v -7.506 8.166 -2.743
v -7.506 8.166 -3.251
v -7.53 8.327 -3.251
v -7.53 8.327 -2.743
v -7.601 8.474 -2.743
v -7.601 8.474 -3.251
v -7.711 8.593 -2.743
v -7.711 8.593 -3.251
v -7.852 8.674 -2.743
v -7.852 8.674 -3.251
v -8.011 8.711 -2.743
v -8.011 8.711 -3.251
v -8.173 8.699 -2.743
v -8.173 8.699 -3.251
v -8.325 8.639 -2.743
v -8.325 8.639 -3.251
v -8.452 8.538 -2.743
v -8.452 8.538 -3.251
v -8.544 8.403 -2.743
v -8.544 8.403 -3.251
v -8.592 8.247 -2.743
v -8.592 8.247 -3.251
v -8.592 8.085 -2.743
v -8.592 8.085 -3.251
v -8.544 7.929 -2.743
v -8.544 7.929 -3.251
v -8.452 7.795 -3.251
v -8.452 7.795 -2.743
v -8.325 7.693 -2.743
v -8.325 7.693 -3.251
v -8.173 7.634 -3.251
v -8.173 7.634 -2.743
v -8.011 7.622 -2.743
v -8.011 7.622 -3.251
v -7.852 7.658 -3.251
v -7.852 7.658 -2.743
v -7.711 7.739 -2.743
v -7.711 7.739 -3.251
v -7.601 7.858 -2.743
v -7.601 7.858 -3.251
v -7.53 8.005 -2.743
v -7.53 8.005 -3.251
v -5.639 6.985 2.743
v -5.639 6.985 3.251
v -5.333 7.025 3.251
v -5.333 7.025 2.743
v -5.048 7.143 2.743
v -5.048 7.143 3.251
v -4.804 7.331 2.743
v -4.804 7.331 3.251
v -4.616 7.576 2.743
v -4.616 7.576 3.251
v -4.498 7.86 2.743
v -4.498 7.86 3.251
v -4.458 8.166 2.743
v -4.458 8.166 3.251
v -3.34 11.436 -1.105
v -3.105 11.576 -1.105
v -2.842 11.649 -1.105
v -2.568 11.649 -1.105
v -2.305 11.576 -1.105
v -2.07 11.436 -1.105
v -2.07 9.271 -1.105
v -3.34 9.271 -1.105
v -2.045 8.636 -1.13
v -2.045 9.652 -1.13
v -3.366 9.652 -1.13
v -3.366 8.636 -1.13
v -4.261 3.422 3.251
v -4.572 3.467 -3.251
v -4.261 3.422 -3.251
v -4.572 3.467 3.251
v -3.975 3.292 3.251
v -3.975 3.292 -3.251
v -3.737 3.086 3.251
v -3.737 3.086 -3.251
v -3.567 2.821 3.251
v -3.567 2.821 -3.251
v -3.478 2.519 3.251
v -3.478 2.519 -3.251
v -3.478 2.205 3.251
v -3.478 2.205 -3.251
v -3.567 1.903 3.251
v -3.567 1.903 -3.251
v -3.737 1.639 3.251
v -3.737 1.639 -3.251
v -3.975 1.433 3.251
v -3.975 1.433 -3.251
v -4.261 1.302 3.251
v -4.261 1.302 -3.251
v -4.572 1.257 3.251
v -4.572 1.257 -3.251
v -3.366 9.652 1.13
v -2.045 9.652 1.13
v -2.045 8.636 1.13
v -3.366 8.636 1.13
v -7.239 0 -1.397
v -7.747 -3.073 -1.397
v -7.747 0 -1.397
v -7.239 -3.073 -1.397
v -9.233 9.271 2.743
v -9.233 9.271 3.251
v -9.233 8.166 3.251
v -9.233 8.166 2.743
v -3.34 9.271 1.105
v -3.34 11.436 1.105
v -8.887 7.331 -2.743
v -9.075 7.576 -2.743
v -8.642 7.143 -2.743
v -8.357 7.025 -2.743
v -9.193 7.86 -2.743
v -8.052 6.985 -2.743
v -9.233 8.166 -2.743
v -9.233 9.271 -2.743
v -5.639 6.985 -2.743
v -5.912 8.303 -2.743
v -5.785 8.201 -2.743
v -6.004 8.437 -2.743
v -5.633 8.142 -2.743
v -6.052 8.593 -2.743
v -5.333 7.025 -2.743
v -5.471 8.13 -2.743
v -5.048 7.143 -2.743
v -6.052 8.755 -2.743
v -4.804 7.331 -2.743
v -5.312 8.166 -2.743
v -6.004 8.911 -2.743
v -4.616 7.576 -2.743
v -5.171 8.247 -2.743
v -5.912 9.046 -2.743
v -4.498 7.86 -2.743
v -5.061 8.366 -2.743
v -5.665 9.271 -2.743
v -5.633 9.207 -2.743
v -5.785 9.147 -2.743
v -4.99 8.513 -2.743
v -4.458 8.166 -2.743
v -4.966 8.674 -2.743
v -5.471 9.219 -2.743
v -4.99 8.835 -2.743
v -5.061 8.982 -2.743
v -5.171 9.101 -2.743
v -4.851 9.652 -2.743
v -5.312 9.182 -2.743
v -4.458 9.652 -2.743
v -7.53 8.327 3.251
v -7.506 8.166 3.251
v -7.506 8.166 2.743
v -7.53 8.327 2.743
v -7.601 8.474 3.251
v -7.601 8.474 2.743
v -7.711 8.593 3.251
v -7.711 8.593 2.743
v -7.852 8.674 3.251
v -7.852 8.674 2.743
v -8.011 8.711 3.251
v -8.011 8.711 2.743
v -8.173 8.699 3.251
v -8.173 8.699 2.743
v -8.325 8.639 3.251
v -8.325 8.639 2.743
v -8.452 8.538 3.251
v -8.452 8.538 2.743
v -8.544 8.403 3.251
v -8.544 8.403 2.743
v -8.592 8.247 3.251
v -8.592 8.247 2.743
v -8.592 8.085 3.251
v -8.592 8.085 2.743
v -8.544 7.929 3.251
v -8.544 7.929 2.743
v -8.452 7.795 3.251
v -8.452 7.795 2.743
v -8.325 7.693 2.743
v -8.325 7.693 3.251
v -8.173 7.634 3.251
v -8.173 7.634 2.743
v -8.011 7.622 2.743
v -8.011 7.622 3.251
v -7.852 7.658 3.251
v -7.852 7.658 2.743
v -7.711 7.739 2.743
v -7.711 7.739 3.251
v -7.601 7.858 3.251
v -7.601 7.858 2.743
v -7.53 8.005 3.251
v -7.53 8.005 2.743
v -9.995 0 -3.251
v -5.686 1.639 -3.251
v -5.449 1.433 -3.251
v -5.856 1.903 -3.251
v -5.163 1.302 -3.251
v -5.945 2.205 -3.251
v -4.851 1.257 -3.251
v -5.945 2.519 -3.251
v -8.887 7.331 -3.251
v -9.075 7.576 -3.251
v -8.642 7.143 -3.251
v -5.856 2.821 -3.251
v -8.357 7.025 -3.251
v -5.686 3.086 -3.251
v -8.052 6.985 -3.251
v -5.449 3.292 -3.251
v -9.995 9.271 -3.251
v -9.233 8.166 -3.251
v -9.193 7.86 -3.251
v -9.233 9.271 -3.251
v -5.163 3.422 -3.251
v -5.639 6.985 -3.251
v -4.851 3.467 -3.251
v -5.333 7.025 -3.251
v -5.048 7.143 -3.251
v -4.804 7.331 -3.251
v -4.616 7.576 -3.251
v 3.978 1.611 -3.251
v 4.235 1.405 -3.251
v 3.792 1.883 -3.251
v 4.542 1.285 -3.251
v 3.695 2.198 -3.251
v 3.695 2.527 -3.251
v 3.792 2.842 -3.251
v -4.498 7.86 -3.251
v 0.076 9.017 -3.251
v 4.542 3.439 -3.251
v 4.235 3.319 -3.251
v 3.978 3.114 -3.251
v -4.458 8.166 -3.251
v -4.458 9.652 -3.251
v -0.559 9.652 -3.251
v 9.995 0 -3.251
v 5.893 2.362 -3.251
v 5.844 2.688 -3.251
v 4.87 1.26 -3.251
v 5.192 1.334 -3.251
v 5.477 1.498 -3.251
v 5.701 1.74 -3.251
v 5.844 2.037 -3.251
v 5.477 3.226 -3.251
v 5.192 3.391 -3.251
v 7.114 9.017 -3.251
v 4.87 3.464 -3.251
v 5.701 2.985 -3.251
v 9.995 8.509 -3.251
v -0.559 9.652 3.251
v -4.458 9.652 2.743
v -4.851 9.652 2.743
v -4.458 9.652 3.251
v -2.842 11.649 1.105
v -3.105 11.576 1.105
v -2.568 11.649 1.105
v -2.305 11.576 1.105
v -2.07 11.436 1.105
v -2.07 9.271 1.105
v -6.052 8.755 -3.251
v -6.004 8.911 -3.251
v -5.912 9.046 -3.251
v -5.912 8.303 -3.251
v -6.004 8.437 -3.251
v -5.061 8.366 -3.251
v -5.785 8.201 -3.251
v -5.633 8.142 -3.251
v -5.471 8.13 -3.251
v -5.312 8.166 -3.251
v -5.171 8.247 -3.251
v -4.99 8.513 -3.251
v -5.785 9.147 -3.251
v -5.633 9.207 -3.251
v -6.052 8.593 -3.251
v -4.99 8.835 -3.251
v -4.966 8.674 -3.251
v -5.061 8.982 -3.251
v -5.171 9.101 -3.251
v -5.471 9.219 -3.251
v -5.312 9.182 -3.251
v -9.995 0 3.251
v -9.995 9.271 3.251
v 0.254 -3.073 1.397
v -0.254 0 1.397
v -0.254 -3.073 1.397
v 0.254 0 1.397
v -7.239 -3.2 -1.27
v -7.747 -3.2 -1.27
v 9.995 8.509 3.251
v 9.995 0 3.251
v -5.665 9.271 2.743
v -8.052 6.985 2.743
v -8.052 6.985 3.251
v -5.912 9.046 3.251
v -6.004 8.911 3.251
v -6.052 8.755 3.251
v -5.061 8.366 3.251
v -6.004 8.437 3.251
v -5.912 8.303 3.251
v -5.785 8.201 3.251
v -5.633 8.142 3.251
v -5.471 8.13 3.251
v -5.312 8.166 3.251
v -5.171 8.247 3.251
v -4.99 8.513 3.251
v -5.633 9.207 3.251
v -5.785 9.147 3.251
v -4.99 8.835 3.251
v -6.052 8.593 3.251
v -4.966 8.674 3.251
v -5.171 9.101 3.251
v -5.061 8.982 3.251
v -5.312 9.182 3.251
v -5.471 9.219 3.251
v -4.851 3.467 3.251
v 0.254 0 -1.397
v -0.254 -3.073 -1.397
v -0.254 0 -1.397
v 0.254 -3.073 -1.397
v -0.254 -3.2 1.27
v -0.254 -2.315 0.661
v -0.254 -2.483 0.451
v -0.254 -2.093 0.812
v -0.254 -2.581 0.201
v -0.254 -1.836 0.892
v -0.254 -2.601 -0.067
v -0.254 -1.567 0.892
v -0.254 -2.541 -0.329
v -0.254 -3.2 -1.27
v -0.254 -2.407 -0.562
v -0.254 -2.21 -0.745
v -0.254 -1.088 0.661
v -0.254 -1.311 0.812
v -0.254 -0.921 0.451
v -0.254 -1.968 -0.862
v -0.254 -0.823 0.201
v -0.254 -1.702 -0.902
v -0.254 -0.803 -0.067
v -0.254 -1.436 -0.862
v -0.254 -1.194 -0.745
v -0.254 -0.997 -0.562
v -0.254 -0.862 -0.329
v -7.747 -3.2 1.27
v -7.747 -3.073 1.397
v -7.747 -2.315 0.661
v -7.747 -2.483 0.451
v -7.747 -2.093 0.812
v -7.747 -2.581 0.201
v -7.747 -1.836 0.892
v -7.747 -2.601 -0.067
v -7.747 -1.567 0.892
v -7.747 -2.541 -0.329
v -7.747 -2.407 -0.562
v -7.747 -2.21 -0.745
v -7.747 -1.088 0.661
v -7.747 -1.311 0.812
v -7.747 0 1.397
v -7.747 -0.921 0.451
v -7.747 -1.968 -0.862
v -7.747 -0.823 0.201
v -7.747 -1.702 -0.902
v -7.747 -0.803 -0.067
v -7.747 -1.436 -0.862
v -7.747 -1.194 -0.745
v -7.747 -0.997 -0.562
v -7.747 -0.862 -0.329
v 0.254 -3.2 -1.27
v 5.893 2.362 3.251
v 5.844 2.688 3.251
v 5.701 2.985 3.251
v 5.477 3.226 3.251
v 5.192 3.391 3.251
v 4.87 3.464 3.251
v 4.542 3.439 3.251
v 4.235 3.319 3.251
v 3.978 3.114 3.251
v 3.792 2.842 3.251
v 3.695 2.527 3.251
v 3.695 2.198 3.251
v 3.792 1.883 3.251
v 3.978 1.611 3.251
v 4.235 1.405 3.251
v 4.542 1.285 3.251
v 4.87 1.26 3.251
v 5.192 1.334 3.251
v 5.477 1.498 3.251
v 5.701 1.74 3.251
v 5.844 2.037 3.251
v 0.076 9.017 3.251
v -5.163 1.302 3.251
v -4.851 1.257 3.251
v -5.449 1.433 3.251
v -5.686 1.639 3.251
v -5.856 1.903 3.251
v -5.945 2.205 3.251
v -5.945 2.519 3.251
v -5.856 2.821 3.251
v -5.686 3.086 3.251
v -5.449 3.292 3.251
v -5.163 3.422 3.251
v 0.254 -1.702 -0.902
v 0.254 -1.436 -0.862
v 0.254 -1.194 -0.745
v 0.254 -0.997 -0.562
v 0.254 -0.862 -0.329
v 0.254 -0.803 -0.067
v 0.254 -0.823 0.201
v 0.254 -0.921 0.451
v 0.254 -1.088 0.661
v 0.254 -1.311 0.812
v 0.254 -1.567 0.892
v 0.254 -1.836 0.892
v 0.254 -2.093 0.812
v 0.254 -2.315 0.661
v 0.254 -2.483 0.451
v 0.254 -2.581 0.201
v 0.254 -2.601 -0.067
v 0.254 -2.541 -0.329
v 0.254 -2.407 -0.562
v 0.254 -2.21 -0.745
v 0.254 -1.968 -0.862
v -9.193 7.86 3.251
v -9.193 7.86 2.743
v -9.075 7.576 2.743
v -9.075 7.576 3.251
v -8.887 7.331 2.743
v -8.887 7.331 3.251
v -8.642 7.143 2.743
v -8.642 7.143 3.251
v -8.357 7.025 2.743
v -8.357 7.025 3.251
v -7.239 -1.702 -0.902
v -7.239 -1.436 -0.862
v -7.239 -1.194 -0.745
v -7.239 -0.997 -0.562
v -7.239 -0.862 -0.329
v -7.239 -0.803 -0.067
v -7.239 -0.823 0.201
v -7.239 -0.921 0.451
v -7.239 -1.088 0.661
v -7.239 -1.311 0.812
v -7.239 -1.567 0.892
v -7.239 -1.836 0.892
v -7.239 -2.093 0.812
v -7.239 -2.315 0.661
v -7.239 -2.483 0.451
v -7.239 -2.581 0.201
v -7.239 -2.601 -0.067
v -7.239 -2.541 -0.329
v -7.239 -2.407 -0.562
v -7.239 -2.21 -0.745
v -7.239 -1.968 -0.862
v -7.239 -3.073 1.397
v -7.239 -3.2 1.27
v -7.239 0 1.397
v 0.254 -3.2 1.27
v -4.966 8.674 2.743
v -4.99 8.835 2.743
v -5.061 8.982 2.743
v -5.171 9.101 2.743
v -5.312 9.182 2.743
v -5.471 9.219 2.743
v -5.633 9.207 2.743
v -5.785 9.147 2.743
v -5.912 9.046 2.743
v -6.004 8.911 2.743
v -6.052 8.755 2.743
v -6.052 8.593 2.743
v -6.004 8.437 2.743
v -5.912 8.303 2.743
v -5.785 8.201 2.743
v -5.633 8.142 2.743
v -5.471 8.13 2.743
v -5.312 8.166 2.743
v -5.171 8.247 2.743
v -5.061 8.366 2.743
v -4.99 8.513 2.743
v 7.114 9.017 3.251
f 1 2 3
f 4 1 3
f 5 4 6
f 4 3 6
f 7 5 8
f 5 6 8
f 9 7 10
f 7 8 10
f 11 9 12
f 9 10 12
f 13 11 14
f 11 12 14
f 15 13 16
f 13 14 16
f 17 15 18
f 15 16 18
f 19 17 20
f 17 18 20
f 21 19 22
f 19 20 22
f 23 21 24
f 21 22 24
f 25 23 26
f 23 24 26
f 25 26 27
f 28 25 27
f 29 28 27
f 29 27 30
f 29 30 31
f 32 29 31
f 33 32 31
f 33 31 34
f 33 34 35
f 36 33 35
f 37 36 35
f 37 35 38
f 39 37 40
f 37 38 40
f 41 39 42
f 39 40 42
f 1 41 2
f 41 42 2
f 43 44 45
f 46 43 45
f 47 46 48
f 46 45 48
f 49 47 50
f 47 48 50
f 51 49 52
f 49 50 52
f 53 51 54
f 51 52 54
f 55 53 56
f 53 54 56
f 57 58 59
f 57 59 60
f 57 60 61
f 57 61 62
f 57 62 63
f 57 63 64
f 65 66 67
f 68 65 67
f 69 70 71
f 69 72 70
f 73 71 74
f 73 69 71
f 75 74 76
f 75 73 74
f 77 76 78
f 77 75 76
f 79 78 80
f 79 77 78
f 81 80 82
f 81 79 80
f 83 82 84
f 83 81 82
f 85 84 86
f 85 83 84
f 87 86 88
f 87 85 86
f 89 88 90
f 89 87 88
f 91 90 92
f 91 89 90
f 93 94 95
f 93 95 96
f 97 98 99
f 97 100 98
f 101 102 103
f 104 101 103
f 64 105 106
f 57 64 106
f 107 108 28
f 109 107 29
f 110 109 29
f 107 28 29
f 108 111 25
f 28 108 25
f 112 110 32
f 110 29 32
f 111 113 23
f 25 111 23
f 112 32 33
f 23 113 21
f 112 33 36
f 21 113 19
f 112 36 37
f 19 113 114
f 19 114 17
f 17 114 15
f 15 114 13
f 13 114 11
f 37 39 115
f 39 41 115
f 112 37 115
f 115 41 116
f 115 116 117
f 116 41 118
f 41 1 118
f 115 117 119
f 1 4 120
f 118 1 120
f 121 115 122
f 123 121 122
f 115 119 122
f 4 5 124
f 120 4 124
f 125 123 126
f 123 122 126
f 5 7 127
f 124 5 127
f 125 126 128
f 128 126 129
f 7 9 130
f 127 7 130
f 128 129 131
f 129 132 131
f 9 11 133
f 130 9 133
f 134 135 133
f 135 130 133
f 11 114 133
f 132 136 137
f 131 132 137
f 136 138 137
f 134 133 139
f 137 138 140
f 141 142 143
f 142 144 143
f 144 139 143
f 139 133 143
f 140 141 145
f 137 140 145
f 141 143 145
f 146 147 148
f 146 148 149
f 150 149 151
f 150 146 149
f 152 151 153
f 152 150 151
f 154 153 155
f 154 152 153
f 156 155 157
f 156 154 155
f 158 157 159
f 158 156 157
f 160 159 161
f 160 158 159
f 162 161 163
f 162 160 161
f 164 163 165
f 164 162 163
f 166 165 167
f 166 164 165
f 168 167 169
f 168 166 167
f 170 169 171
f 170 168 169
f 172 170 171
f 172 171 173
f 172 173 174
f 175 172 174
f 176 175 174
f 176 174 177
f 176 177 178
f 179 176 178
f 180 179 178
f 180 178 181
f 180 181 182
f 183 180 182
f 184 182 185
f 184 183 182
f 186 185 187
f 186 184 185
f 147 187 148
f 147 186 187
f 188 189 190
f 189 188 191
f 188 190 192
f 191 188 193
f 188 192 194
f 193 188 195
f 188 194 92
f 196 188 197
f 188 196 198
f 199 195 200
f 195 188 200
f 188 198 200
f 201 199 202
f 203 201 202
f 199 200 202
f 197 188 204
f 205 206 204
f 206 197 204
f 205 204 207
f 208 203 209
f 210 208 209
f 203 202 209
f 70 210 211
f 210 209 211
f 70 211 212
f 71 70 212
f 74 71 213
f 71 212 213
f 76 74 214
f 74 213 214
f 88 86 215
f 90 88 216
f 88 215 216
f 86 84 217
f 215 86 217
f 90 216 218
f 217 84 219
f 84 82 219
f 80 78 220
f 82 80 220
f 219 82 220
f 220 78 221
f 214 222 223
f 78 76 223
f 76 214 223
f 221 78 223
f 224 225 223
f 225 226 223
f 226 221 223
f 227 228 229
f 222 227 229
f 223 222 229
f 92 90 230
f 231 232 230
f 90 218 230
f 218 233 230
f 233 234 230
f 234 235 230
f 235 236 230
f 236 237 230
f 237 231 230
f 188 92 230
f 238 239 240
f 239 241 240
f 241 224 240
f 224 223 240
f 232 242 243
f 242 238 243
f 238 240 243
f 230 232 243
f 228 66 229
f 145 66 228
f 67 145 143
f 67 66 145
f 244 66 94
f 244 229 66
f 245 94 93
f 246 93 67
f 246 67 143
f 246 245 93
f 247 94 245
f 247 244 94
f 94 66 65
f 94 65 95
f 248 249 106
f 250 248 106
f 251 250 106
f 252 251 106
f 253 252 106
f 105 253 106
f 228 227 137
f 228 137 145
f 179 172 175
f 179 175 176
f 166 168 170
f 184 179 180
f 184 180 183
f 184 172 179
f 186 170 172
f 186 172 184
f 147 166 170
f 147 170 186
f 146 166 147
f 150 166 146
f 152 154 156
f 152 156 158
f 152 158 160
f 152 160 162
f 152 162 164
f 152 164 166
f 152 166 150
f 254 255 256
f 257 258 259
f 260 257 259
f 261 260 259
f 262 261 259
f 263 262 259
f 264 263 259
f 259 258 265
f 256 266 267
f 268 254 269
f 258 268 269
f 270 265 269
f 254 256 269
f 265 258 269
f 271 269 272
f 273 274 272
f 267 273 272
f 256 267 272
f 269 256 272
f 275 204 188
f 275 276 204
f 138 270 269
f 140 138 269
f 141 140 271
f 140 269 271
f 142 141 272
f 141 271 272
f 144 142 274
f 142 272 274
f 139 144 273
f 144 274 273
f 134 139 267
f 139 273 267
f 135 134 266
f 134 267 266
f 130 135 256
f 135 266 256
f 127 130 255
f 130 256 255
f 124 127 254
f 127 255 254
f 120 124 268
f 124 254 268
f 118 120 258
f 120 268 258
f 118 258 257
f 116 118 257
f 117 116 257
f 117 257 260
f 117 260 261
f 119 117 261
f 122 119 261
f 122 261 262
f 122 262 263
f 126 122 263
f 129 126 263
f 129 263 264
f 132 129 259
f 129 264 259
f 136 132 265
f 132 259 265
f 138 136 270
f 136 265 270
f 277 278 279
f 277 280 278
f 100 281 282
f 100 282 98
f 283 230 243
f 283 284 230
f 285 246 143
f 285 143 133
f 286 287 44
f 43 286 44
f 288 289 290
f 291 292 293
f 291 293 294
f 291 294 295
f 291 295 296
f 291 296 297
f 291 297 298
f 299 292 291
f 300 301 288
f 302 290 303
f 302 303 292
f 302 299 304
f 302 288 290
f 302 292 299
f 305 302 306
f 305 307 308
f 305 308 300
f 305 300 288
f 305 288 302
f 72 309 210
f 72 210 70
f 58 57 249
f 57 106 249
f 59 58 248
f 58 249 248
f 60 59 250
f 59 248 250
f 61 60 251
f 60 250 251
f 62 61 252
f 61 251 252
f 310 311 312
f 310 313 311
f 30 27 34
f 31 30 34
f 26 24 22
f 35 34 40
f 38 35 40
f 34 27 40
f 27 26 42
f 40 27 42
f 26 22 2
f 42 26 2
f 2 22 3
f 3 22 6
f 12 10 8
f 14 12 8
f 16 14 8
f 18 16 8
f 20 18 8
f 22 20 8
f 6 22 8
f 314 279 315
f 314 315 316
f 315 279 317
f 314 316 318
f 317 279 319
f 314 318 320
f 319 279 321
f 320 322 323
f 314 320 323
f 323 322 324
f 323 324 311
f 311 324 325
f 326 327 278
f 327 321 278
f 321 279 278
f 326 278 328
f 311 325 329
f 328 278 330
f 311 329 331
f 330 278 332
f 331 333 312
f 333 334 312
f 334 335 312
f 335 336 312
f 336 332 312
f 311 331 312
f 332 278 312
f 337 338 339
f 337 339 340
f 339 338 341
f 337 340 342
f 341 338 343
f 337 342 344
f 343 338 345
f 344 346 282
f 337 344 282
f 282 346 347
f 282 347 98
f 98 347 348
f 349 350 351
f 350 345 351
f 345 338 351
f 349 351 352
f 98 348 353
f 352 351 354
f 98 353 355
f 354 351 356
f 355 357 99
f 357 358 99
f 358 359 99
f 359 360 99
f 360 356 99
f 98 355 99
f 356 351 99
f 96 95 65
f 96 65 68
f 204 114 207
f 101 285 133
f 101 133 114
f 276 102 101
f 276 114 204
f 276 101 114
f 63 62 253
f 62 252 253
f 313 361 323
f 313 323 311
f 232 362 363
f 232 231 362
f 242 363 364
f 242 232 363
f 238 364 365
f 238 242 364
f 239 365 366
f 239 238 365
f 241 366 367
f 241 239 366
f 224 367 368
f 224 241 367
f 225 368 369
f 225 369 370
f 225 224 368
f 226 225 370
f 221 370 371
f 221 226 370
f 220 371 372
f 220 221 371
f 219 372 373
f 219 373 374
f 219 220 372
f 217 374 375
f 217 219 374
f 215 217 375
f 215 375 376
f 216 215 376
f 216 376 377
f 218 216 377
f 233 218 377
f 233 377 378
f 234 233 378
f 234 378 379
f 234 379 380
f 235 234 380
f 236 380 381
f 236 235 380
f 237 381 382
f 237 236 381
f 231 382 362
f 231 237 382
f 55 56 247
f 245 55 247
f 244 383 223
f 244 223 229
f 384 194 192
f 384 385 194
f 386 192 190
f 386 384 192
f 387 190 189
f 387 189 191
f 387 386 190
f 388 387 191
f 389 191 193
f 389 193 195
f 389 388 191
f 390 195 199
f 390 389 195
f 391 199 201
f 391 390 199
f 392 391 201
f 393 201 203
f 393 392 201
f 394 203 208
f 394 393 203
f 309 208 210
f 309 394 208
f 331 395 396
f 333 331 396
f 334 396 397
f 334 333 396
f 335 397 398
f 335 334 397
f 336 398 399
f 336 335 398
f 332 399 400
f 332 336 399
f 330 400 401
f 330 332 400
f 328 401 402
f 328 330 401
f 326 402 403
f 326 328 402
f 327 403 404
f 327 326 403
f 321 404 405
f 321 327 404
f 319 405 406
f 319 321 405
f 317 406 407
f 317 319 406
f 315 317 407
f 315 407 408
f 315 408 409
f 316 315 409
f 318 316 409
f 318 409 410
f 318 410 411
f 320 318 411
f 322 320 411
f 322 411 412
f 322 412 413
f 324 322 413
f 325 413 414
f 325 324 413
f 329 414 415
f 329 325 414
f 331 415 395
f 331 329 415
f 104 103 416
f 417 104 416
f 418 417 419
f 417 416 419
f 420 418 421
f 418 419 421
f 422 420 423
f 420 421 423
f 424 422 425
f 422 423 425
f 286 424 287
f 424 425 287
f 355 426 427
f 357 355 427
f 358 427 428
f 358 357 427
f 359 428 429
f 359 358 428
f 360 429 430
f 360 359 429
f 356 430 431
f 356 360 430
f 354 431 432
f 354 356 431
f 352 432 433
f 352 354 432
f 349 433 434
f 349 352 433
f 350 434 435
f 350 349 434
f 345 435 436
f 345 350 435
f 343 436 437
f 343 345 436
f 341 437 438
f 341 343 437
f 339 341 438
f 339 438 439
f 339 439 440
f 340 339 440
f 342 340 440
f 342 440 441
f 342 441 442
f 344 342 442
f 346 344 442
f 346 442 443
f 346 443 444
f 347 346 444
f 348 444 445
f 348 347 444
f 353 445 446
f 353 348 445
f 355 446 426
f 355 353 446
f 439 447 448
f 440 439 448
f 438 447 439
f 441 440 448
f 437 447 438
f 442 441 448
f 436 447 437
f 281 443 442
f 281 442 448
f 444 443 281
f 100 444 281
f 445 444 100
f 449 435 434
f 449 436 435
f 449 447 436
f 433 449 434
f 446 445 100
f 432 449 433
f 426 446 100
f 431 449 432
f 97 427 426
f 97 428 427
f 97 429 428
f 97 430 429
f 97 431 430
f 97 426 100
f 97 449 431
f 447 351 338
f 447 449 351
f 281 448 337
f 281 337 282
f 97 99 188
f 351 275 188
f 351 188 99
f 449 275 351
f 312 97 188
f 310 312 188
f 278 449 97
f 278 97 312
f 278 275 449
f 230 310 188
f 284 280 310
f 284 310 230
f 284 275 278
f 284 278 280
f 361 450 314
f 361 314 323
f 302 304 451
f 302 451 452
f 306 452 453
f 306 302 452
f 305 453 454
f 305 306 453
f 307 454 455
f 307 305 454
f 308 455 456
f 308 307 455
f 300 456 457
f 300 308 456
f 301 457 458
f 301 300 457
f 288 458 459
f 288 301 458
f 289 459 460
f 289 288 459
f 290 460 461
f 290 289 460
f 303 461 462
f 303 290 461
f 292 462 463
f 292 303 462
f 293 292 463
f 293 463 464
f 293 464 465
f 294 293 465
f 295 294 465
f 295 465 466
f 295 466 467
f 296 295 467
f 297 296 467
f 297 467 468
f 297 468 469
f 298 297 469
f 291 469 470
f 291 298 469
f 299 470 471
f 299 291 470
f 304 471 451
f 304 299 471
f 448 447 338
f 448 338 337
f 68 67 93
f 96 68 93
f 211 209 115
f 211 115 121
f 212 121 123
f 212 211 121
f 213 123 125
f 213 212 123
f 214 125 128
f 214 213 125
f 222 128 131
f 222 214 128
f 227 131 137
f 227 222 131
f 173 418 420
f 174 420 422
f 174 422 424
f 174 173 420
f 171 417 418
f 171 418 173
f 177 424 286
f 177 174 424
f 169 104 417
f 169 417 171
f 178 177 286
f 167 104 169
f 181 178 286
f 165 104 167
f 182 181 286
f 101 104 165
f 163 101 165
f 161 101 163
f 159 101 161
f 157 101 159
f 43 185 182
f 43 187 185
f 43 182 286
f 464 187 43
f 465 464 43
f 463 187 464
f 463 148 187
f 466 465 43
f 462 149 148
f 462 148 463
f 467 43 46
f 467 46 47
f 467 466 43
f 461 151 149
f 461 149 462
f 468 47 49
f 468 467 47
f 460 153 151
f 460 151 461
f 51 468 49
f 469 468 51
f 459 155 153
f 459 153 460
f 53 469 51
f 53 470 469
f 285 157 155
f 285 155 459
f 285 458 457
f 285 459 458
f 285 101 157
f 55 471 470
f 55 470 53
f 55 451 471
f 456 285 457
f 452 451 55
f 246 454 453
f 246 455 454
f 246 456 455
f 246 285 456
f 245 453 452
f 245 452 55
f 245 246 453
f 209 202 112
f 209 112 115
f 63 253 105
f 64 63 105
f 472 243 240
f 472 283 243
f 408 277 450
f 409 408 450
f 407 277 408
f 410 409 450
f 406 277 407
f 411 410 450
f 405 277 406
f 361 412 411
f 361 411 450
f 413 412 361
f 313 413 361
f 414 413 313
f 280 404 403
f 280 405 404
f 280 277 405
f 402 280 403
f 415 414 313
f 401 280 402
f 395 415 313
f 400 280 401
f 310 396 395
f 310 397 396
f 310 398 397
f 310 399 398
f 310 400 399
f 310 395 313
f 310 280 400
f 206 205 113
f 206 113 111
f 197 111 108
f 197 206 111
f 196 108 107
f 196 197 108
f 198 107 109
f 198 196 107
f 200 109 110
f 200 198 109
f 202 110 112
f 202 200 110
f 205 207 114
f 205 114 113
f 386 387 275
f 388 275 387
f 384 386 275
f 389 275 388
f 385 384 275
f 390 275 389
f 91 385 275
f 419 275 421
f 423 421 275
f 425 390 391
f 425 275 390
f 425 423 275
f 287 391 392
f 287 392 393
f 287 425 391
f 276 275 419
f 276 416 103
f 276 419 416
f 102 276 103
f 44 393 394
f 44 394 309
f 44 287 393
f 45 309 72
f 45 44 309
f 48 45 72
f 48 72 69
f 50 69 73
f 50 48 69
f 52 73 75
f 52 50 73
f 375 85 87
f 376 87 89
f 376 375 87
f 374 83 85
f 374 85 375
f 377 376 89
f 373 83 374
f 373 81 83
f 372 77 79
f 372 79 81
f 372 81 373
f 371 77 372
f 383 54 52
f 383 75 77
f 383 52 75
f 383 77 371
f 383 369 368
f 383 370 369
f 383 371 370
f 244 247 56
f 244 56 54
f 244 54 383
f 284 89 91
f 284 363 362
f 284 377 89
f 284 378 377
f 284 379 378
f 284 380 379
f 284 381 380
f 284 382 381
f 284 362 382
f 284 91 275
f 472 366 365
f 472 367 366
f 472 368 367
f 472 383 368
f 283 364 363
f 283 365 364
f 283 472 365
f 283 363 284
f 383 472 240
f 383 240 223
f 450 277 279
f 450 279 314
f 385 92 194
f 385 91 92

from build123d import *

# Parameters (mm, degrees)
SKETCH2_R          = 1.1049
EXTRUDE1_DEPTH     = 3.2512
EXTRUDE2_DEPTH     = 1.1049
SKETCH4_W          = 1.3208
SKETCH4_H          = 2.2606
CUT_EXTRUDE1_DEPTH = 1.016
SKETCH5_R          = 0.5461
CUT_EXTRUDE2_DEPTH = 0.508
SKETCH10_R         = 0.9017
EXTRUDE6_DEPTH     = 0.254
LPATTERN1_COUNT    = 2
LPATTERN1_PITCH    = 7.493


with BuildPart() as part:
    # Sketch2 → Extrude1 (new body, symmetric)
    with BuildSketch(Plane.XY):
        Polygon((9.9949, 8.509), (7.113888836, 9.017), (0.0762, 9.017), (-0.5588, 9.652), (-4.8514, 9.652), (-5.664596778, 9.271), (-9.9949, 9.271), (-9.9949, 0), (9.9949, 0), align=None)
        with Locations((4.7879, 2.3622)):
            Circle(SKETCH2_R, mode=Mode.SUBTRACT)
        with BuildLine():
            Line((-4.8514, 3.4671), (-4.572, 3.4671))
            ThreePointArc((-4.572, 3.4671), (-3.4671, 2.3622), (-4.572, 1.2573))
            Line((-4.572, 1.2573), (-4.8514, 1.2573))
            ThreePointArc((-4.8514, 1.2573), (-5.9563, 2.3622), (-4.8514, 3.4671))
        make_face(mode=Mode.SUBTRACT)
    extrude(amount=EXTRUDE1_DEPTH, both=True)

    # Sketch4 → Cut-Extrude1 (cut)
    with BuildSketch(Plane(origin=(0, 9.652, 0), x_dir=(-1, 0, 0), z_dir=(0, 1, 0))):
        with Locations((2.7051, 0)):
            Rectangle(SKETCH4_W, SKETCH4_H)
    extrude(amount=-CUT_EXTRUDE1_DEPTH, mode=Mode.SUBTRACT)

    # Sketch5 → Cut-Extrude2 (cut)
    with BuildSketch(Plane.XY.offset(3.2512)):
        with BuildLine():
            Line((-9.2329, 9.271), (-9.2329, 8.1661))
            ThreePointArc((-9.2329, 8.1661), (-8.886963819, 7.330936181), (-8.0518, 6.985))
            Line((-8.0518, 6.985), (-5.6388, 6.985))
            ThreePointArc((-5.6388, 6.985), (-4.803636181, 7.330936181), (-4.4577, 8.1661))
            Line((-4.4577, 8.1661), (-4.4577, 9.652))
            Line((-4.4577, 9.652), (-4.8514, 9.652))
            Line((-4.8514, 9.652), (-5.664596778, 9.271))
            Line((-5.664596778, 9.271), (-9.2329, 9.271))
        make_face()
        with Locations((-5.5118, 8.6741)):
            Circle(SKETCH5_R, mode=Mode.SUBTRACT)
        with Locations((-8.0518, 8.1661)):
            Circle(SKETCH5_R, mode=Mode.SUBTRACT)
    cut_extrude2 = extrude(amount=-CUT_EXTRUDE2_DEPTH, mode=Mode.SUBTRACT)

    # Mirror1: Cut-Extrude2 across plane
    add(cut_extrude2.mirror(Plane.XY), mode=Mode.SUBTRACT)

    # Sketch10 → Extrude6 (add, symmetric)
    with BuildSketch(Plane(origin=(-7.493, 0, 0), x_dir=(0, 0, -1), z_dir=(1, 0, 0))):
        Polygon((-1.397, 0), (-1.397, -3.0734), (-1.27, -3.2004), (1.27, -3.2004), (1.397, -3.0734), (1.397, 0), align=None)
        with Locations((0, -1.7018)):
            Circle(SKETCH10_R, mode=Mode.SUBTRACT)
    extrude6 = extrude(amount=EXTRUDE6_DEPTH, both=True)

    # LPattern1: Extrude6 ×2
    with Locations(*[(i * LPATTERN1_PITCH, 0, 0) for i in range(1, LPATTERN1_COUNT)]):
        add(extrude6)


with BuildPart() as body_2:
    # Sketch3 → Extrude2 (new body, symmetric)
    with BuildSketch(Plane.XY):
        with BuildLine():
            Line((-3.3401, 9.271), (-3.3401, 11.435714746))
            ThreePointArc((-3.3401, 11.435714746), (-2.7051, 11.6586), (-2.0701, 11.435714746))
            Line((-2.0701, 11.435714746), (-2.0701, 9.271))
            Line((-2.0701, 9.271), (-3.3401, 9.271))
        make_face()
    extrude(amount=EXTRUDE2_DEPTH, both=True)


solid = Compound([part.part, body_2.part])
